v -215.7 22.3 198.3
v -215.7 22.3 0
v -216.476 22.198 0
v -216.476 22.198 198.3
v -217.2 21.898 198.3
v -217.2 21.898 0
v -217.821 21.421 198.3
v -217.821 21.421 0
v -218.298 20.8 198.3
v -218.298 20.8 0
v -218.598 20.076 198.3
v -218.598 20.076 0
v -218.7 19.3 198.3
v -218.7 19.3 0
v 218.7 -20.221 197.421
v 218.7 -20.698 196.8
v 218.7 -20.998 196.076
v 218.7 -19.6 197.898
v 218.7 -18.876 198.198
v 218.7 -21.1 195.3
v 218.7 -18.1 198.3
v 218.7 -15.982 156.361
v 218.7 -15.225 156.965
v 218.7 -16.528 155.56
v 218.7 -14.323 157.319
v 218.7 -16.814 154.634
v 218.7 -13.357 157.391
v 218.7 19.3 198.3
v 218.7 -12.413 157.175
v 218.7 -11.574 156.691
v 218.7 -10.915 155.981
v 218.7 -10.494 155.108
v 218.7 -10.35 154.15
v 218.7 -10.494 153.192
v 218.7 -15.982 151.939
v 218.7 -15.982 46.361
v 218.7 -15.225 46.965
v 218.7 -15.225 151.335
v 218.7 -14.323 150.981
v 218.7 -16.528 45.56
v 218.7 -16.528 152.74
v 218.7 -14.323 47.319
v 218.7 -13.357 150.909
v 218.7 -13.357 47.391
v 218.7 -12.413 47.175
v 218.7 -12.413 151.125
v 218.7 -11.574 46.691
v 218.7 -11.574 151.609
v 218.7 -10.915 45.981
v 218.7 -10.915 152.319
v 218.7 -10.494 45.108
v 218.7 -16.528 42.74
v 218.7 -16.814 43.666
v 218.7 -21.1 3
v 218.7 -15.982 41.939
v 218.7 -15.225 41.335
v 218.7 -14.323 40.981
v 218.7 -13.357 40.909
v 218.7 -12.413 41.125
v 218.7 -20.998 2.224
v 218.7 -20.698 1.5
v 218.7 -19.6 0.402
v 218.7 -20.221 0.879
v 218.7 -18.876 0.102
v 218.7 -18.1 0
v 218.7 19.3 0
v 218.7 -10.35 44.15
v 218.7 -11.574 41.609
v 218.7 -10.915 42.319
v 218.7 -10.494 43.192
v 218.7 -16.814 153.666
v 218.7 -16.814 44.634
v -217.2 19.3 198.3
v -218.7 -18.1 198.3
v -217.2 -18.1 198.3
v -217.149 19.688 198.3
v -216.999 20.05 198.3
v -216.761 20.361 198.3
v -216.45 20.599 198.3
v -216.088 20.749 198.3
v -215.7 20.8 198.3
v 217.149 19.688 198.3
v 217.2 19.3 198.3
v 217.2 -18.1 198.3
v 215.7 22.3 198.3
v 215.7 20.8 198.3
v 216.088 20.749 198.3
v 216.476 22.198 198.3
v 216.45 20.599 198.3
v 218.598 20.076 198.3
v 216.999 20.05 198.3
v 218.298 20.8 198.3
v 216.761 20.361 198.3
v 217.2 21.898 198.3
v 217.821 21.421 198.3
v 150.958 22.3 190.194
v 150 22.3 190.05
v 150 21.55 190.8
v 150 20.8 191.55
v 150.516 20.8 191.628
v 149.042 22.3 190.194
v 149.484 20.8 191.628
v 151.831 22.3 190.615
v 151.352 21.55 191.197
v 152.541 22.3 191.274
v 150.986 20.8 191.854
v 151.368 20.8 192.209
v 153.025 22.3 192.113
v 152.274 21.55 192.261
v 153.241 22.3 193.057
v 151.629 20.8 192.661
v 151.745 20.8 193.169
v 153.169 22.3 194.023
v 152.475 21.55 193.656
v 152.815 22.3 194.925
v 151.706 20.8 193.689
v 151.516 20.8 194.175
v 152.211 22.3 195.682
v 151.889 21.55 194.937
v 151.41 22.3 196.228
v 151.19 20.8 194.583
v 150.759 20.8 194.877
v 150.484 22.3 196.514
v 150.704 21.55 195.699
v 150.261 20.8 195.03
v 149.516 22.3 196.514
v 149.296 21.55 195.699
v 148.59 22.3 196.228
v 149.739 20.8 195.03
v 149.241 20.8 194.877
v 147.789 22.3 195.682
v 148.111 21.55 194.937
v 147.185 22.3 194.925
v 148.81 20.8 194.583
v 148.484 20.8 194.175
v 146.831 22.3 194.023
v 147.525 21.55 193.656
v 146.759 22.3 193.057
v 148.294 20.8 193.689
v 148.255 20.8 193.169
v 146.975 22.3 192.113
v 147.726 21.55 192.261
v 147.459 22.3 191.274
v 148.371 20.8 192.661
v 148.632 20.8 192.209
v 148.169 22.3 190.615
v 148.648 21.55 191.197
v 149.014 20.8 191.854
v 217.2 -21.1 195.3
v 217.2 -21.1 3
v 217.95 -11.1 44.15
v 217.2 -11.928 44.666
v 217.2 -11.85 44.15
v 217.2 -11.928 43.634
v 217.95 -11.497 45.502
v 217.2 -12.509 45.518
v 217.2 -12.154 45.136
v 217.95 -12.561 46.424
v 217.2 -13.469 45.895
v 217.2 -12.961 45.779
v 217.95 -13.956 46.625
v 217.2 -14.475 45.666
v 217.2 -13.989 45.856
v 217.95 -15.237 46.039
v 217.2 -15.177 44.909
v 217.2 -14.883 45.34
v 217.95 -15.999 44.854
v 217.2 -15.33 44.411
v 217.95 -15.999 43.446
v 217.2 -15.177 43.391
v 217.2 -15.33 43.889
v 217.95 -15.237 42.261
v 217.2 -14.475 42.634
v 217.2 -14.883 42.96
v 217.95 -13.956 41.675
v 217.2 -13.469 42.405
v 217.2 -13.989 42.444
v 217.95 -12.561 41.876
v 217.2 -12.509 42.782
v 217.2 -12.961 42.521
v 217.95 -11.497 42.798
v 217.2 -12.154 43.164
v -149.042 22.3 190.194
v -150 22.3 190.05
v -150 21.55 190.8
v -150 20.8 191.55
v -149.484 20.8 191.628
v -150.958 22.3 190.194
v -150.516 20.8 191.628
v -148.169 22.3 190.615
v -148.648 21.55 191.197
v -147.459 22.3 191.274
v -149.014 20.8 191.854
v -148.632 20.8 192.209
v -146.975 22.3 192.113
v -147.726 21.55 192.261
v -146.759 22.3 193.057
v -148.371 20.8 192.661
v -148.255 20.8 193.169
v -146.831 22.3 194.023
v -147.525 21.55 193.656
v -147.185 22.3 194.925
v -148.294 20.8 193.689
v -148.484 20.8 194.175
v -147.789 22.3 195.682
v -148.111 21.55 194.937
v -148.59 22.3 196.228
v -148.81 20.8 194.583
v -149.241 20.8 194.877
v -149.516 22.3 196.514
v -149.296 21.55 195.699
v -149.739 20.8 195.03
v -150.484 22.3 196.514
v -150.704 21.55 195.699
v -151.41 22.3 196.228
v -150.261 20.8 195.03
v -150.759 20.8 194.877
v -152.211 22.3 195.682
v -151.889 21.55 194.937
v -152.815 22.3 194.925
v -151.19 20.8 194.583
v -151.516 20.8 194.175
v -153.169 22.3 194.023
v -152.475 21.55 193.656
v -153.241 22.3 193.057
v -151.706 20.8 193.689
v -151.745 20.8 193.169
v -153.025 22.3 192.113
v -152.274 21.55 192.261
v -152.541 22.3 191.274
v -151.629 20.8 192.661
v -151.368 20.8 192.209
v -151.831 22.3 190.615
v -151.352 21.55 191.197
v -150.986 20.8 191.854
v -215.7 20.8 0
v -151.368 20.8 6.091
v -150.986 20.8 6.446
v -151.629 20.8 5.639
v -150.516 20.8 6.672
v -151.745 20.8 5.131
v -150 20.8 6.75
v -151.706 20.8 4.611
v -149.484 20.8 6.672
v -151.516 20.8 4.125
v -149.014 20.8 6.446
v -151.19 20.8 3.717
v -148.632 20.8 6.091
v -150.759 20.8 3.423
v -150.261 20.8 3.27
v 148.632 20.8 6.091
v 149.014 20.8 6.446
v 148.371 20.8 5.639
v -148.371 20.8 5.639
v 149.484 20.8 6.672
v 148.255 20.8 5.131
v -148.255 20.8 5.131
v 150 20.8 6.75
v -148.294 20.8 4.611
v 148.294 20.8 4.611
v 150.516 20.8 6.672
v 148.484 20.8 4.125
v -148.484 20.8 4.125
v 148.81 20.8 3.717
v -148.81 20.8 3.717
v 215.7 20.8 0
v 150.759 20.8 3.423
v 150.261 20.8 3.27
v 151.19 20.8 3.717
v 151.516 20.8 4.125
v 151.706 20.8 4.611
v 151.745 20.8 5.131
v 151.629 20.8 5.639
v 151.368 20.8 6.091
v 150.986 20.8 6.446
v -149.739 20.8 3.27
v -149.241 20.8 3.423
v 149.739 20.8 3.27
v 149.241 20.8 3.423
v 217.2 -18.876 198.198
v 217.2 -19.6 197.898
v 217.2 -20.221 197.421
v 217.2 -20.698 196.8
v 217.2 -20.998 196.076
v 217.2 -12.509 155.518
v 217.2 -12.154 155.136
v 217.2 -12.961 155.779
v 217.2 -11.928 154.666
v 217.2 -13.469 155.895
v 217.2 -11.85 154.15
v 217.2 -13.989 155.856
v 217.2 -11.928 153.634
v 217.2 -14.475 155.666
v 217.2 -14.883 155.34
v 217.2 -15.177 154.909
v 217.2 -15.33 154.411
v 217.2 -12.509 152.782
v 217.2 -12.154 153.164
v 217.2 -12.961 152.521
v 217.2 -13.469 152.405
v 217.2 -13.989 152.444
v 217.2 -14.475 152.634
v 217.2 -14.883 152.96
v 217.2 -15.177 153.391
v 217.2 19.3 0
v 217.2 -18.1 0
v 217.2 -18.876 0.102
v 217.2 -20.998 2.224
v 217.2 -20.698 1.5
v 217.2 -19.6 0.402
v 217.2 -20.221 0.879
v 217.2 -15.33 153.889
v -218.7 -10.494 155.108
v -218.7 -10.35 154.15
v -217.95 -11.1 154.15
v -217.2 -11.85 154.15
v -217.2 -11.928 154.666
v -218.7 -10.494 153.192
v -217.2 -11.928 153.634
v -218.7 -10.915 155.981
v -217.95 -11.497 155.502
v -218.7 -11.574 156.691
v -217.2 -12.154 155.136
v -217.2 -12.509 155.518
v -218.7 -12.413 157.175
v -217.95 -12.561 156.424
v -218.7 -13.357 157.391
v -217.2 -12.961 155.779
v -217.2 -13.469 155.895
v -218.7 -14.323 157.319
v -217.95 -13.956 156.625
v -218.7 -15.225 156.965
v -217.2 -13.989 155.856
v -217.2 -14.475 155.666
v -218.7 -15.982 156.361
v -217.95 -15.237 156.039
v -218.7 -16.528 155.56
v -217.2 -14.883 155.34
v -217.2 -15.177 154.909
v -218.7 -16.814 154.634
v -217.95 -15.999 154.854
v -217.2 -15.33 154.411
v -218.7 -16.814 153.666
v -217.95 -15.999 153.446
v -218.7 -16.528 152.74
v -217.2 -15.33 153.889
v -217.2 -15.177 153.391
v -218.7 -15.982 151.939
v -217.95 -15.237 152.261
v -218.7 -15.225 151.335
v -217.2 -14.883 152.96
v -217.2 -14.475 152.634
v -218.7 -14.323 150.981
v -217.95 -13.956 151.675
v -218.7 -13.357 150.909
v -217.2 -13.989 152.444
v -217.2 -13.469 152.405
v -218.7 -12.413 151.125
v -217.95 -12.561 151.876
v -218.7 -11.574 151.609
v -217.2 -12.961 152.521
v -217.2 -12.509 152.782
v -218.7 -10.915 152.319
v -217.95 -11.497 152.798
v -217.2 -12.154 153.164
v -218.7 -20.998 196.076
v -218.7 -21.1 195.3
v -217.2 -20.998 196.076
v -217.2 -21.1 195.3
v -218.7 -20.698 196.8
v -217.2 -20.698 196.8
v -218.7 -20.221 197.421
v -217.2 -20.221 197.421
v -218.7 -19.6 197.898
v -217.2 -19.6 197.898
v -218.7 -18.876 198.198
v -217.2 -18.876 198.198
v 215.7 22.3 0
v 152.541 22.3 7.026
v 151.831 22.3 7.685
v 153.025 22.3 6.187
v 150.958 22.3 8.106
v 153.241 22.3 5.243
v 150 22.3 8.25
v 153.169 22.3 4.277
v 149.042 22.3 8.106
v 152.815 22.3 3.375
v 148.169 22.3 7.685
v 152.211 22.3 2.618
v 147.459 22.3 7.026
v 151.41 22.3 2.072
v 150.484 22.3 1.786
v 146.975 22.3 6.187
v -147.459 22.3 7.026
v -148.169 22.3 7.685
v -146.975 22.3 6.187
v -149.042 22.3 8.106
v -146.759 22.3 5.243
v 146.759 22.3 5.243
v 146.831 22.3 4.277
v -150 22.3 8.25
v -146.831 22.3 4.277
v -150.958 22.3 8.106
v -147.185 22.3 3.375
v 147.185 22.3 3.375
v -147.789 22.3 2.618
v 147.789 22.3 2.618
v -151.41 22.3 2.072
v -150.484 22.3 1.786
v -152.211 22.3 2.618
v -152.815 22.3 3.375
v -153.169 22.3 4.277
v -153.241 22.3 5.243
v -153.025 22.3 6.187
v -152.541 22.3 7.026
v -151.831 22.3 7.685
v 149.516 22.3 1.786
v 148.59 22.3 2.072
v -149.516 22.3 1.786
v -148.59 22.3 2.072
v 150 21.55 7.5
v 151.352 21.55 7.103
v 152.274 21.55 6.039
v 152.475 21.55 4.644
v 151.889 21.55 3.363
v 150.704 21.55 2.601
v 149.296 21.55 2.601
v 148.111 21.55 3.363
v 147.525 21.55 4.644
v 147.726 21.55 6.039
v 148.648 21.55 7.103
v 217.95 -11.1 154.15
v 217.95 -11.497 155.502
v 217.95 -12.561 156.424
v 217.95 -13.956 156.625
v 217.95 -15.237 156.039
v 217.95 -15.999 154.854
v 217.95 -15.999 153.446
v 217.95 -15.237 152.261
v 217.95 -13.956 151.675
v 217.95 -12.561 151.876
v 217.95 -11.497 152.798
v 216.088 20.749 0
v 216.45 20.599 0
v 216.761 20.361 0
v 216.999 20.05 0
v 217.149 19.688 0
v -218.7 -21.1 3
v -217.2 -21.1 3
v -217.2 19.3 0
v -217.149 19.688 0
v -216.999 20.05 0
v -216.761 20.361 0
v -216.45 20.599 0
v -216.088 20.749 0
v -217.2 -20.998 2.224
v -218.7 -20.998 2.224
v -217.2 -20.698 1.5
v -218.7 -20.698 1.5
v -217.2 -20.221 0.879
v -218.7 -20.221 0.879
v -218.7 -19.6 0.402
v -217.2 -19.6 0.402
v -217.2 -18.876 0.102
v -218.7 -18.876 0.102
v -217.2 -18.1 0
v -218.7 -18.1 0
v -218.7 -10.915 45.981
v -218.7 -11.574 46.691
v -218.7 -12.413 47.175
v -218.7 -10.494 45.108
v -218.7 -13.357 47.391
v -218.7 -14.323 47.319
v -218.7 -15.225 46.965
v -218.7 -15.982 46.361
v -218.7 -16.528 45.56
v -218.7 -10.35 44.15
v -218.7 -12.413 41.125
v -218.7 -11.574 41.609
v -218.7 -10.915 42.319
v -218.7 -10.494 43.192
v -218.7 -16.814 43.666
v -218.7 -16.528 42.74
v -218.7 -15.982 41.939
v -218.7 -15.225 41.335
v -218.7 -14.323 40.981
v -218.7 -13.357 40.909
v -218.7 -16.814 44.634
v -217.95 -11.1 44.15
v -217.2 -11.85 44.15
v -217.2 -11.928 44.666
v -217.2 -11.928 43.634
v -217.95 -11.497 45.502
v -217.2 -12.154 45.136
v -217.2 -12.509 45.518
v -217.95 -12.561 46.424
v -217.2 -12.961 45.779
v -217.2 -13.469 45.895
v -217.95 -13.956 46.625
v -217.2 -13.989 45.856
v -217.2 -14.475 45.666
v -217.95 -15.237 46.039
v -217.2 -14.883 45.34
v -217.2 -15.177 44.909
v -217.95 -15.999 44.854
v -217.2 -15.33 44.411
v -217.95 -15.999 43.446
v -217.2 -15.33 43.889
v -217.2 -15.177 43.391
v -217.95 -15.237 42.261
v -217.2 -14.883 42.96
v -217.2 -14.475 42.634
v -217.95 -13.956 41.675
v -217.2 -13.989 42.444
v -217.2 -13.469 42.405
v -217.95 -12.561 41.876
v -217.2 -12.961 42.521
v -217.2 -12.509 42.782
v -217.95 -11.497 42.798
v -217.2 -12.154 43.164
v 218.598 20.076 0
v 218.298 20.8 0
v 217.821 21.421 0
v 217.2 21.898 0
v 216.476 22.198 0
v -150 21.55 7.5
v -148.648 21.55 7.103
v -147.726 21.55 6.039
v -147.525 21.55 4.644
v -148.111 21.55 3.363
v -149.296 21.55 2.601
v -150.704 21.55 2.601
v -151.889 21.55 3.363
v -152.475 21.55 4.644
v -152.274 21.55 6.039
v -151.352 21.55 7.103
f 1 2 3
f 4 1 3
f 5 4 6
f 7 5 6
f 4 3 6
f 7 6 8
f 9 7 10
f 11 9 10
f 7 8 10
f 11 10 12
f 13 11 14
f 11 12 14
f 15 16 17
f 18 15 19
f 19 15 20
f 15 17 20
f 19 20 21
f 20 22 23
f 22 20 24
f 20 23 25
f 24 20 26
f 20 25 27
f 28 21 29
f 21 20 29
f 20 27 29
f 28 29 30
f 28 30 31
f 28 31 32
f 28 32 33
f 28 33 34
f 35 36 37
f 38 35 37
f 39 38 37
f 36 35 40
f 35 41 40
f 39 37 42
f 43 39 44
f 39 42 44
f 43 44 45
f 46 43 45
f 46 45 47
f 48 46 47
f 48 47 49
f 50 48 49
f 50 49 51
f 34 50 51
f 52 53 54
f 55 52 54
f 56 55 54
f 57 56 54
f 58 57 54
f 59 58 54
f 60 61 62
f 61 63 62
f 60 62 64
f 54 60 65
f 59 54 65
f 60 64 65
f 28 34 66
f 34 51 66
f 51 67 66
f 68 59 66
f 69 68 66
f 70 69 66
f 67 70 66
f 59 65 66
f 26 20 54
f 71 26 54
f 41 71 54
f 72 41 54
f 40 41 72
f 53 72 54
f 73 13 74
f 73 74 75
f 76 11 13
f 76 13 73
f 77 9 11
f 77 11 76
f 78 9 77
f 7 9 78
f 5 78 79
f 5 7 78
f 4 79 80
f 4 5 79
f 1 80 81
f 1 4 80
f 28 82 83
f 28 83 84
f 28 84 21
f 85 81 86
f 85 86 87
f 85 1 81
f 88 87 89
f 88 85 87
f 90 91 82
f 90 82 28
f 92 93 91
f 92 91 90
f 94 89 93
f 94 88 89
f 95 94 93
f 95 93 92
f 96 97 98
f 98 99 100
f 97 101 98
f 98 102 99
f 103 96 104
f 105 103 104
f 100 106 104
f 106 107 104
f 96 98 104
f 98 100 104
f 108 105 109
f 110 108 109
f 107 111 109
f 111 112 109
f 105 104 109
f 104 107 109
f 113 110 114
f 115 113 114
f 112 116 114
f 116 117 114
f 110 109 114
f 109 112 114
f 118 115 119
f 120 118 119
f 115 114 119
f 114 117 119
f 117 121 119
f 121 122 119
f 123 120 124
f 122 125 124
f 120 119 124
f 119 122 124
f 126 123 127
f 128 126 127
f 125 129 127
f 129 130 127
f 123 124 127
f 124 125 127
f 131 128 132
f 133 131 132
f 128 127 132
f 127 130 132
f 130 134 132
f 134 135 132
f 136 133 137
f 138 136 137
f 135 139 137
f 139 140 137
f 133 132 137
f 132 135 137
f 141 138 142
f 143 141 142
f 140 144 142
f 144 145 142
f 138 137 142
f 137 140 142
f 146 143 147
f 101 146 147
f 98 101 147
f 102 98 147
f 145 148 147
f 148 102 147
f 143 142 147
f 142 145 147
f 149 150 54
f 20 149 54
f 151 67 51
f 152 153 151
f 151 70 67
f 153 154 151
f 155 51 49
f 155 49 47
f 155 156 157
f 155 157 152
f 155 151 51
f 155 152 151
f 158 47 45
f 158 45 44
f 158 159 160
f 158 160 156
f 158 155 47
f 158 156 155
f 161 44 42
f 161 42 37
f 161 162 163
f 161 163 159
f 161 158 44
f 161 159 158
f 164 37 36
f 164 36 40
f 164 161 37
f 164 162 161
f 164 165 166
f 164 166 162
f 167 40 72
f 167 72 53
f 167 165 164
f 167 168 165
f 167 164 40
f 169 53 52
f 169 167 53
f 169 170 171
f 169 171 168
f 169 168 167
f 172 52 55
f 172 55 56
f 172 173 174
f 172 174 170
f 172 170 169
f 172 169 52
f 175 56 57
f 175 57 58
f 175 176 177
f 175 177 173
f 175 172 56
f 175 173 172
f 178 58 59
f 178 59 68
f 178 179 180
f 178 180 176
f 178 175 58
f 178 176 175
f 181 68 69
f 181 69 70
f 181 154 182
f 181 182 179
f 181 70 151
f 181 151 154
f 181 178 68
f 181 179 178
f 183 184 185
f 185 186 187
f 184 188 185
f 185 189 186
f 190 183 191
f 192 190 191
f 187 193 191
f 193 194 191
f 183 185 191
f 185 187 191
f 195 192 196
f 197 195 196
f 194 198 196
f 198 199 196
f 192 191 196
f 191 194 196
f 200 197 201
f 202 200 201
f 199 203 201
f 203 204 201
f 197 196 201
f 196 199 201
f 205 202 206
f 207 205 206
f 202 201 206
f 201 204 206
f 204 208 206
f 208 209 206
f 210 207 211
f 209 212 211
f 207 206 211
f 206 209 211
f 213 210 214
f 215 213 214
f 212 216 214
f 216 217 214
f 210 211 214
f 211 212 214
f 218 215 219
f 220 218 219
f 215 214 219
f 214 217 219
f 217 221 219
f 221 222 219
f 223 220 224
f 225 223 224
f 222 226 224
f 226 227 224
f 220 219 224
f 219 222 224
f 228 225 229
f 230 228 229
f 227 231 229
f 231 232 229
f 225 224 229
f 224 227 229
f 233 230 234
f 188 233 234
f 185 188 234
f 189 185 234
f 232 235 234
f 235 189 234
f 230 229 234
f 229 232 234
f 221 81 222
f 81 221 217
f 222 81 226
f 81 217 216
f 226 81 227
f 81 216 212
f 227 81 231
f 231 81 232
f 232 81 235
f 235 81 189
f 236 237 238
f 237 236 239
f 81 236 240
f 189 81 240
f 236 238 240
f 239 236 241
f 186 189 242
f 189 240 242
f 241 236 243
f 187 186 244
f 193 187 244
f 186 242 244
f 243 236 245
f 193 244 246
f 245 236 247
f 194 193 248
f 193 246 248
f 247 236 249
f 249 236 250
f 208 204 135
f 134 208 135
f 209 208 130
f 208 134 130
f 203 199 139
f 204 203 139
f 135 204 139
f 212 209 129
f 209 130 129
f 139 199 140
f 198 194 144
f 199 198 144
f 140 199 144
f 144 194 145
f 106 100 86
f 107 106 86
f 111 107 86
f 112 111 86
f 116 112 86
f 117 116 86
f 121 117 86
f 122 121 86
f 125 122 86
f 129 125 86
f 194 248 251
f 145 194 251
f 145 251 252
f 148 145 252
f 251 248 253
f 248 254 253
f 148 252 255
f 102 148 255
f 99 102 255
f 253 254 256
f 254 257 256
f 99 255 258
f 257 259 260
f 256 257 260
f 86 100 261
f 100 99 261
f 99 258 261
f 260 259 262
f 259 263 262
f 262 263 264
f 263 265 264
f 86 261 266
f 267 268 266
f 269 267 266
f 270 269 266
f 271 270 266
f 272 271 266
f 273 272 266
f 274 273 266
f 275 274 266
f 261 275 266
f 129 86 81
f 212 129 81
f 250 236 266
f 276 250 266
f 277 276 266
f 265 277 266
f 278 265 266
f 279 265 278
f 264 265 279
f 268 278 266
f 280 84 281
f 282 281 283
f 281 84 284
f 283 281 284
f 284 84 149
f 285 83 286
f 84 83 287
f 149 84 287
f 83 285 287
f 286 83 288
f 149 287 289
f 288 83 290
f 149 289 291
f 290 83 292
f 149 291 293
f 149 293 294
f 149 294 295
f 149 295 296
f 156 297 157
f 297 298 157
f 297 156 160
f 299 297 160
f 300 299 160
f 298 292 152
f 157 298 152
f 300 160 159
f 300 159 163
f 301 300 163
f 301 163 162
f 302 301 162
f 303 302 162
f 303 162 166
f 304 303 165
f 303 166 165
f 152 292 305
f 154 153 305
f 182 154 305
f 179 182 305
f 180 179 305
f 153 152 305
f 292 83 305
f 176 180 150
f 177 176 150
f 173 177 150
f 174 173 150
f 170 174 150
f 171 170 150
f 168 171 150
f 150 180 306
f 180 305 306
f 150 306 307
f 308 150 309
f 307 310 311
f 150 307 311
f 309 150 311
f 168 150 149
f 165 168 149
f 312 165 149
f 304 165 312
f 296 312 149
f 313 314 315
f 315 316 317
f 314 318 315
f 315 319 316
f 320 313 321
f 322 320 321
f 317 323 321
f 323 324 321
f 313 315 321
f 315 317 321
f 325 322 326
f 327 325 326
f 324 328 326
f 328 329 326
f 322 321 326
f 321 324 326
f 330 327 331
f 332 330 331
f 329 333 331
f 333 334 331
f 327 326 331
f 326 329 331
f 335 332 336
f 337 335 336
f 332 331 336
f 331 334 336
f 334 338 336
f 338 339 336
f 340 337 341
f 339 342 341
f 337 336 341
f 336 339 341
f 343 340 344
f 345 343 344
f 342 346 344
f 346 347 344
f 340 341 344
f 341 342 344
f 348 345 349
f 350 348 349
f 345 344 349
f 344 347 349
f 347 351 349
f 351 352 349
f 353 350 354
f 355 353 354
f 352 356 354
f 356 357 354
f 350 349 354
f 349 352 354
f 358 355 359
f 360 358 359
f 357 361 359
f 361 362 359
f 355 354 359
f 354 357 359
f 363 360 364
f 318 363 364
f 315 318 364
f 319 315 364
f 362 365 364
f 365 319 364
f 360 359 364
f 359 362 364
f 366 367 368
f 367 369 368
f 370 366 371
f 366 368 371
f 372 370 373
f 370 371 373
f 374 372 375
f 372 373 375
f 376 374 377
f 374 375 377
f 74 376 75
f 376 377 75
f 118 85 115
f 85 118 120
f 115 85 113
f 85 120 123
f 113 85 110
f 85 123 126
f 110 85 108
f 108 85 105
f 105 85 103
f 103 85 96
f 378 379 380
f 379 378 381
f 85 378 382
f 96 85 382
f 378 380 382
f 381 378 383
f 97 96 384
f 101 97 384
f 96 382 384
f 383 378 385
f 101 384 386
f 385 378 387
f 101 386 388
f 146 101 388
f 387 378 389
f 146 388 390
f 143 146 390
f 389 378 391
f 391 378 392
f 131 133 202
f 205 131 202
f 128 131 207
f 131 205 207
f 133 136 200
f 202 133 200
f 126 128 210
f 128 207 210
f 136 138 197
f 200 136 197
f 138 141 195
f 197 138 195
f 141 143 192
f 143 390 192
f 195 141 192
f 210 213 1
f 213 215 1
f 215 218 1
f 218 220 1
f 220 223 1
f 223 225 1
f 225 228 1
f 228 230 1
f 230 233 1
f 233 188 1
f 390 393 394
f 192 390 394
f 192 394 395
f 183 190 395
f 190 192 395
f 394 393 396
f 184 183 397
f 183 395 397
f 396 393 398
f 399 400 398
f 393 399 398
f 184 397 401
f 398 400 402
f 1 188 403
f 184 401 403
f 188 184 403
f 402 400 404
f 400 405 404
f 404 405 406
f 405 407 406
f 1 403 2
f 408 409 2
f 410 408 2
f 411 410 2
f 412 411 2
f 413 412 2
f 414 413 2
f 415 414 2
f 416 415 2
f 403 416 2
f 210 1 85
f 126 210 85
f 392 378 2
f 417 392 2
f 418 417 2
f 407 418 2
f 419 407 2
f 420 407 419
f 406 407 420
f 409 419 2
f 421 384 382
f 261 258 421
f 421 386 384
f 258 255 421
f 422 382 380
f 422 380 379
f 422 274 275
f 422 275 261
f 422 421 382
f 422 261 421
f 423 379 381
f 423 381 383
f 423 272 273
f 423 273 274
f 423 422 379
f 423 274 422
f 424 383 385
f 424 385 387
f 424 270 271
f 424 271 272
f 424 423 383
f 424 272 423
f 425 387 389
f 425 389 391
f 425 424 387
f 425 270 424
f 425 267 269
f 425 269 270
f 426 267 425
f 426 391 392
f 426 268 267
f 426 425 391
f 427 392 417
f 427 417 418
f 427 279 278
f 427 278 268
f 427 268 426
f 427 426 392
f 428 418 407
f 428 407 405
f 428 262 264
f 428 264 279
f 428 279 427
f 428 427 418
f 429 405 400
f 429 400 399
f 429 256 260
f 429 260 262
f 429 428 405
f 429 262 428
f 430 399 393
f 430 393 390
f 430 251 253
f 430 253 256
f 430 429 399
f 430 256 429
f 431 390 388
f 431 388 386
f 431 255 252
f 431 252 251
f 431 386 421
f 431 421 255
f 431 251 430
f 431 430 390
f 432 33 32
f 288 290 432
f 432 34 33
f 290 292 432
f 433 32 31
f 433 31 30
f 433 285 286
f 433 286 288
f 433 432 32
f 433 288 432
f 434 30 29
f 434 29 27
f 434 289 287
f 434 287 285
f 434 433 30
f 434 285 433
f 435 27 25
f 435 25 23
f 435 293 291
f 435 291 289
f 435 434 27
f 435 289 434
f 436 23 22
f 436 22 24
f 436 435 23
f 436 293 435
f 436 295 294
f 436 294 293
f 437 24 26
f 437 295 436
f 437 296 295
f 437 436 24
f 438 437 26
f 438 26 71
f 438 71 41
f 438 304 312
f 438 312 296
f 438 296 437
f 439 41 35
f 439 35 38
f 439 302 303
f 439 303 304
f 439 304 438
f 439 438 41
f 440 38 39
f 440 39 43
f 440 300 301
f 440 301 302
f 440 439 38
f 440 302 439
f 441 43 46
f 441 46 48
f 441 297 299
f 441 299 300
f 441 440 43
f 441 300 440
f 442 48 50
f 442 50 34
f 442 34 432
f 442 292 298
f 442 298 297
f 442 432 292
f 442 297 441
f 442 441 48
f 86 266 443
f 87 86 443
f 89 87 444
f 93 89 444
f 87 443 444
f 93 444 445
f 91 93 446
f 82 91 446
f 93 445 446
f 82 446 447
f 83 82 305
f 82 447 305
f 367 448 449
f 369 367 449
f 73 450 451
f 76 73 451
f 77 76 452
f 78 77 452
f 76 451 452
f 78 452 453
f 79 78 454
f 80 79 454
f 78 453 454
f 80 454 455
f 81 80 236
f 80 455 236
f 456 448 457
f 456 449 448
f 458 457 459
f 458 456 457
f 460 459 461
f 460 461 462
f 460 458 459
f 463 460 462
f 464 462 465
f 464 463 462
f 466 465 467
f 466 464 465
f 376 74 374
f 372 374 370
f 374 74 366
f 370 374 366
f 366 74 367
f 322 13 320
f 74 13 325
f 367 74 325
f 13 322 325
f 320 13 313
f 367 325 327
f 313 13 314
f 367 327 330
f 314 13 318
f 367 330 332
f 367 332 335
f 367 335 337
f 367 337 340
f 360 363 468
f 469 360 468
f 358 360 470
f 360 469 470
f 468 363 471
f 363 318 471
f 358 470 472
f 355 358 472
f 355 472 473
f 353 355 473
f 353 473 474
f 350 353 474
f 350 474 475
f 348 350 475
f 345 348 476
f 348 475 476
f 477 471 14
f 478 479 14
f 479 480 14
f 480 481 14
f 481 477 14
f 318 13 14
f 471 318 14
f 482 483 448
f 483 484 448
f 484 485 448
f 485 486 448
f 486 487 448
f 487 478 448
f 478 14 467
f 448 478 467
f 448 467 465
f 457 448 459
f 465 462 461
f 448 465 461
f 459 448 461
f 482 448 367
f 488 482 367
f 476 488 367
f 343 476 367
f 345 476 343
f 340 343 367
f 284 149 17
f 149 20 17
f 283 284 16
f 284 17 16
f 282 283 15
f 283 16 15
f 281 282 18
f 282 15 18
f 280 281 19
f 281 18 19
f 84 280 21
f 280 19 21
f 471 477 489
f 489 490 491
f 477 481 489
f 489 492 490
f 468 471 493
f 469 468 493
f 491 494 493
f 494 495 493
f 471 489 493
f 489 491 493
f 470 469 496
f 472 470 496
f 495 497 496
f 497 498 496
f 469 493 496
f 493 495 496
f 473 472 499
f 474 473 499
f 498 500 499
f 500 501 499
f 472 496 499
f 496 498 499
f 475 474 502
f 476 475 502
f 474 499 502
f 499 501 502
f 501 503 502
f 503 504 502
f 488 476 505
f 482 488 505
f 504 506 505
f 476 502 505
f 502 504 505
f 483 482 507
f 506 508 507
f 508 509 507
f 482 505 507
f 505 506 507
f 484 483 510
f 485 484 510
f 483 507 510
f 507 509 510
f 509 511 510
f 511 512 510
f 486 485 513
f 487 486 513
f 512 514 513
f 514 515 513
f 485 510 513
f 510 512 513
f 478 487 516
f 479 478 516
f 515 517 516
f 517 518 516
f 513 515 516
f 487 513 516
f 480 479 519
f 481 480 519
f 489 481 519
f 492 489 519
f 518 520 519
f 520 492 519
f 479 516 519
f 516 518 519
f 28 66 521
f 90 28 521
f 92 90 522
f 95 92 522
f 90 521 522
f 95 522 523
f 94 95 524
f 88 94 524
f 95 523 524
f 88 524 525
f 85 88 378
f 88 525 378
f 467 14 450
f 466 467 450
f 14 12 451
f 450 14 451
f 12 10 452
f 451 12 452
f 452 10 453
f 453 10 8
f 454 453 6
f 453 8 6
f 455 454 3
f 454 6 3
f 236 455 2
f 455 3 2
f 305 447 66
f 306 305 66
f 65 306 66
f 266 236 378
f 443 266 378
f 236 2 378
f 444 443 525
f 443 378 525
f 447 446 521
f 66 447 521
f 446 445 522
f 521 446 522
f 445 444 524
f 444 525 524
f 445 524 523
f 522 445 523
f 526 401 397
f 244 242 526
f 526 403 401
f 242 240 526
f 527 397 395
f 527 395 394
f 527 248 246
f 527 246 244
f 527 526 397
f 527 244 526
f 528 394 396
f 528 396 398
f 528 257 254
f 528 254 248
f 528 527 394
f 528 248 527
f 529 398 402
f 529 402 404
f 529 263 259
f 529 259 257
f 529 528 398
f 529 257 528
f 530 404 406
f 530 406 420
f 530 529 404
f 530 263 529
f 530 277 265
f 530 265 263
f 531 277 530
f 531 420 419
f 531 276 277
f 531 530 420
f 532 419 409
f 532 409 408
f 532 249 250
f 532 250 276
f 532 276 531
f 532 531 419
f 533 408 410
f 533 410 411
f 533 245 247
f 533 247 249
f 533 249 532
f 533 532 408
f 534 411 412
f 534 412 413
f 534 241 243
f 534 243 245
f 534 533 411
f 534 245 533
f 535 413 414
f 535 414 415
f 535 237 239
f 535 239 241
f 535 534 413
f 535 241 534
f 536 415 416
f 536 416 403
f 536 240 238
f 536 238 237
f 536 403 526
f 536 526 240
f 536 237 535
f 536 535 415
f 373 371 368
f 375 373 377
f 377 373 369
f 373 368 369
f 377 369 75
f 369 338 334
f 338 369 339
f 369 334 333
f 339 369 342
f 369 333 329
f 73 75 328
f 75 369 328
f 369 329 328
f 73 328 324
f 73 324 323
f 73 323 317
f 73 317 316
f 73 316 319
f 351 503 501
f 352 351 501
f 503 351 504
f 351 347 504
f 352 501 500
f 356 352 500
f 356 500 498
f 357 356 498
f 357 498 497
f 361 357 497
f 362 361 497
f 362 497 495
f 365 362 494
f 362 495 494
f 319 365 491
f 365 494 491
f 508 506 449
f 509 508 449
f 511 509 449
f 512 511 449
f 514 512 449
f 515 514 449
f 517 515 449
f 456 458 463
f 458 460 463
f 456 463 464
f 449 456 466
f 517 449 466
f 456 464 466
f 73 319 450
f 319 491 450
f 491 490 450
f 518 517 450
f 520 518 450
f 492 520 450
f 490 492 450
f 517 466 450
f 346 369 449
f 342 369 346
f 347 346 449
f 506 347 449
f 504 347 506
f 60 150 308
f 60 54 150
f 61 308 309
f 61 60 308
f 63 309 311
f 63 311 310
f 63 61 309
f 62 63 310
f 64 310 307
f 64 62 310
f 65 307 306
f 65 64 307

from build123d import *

# Parameters (mm, degrees)
SM_BASE_FLANGE_1_DEPTH = 198.3
FILLET_1_R             = 3
SKETCH_6_R             = 1.65
CUT_EXTRUDE_1_DEPTH    = 299.389242433
CUT_EXTRUDE_2_REACH    = 482.769
SKETCH_7_R             = 1.65
CHAMFER_2_SIZE         = 1.6


# Sheet-metal steps are written as plain solids
with BuildPart() as part:
    # Sketch 1 → Базовая кромка1 (new body)
    with BuildSketch(Plane.XY):
        with BuildLine():
            Line((-217.2, -21.1), (-217.2, 19.3))
            ThreePointArc((-217.2, 19.3), (-216.760660172, 20.360660172), (-215.7, 20.8))
            Line((-215.7, 20.8), (215.7, 20.8))
            ThreePointArc((215.7, 20.8), (216.760660172, 20.360660172), (217.2, 19.3))
            Line((217.2, 19.3), (217.2, -21.1))
            Line((217.2, -21.1), (218.7, -21.1))
            Line((218.7, -21.1), (218.7, 19.3))
            ThreePointArc((218.7, 19.3), (217.821320344, 21.421320344), (215.7, 22.3))
            Line((215.7, 22.3), (-215.7, 22.3))
            ThreePointArc((-215.7, 22.3), (-217.821320344, 21.421320344), (-218.7, 19.3))
            Line((-218.7, 19.3), (-218.7, -21.1))
            Line((-218.7, -21.1), (-217.2, -21.1))
        make_face()
    extrude(amount=SM_BASE_FLANGE_1_DEPTH)

    # Скругление1
    fillet_1_edges = [part.edges().sort_by_distance(p)[0] for p in [
        (-217.95, -21.1, 0),
        (217.95, -21.1, 0),
        (-217.95, -21.1, 198.3),
        (217.95, -21.1, 198.3),
    ]]
    fillet(fillet_1_edges, radius=FILLET_1_R)

    # Эскиз6 → Вырез-Вытянуть1 (cut, through all)
    with BuildSketch(Plane(origin=(0, 22.3, 0), x_dir=(1, 0, 0), z_dir=(0, 1, 0))):
        with Locations(Location((-150, -5, 0), (0, 0, 270))):
            Circle(SKETCH_6_R)
        with Locations(Location((150, -5, 0), (0, 0, 270))):
            Circle(SKETCH_6_R)
    cut_extrude_1 = extrude(amount=-CUT_EXTRUDE_1_DEPTH, mode=Mode.SUBTRACT)

    # Зеркальное отражение1: Вырез-Вытянуть1 across plane
    add(cut_extrude_1.mirror(Plane(origin=(0, 0, 99.15), x_dir=(1, 0, 0), z_dir=(0, 0, -1))), mode=Mode.SUBTRACT)

    # Вырез-Вытянуть2: up to this face of the body (flat: up to its plane)
    cut_extrude_2_end = Plane(part.part.faces().sort_by_distance((-218.7, -0.890578691, 99.15))[0])
    # Эскиз7 → Вырез-Вытянуть2 (cut, up to the picked face)
    with BuildSketch(Plane(origin=(218.7, 0, 0), x_dir=(0, 0, -1), z_dir=(1, 0, 0)), mode=Mode.PRIVATE) as cut_extrude_2_sk1:
        with Locations(Location((-154.15, -13.6, 0), (0, 0, 90))):
            Circle(SKETCH_7_R)
    cut_extrude_2_tool1 = split(extrude(cut_extrude_2_sk1.sketch, amount=-CUT_EXTRUDE_2_REACH, mode=Mode.PRIVATE), bisect_by=cut_extrude_2_end, keep=Keep.BOTH, mode=Mode.PRIVATE)
    # Эскиз7 → Вырез-Вытянуть2 (cut, up to the picked face)
    with BuildSketch(Plane(origin=(218.7, 0, 0), x_dir=(0, 0, -1), z_dir=(1, 0, 0)), mode=Mode.PRIVATE) as cut_extrude_2_sk2:
        with Locations(Location((-44.15, -13.6, 0), (0, 0, 90))):
            Circle(SKETCH_7_R)
    cut_extrude_2_tool2 = split(extrude(cut_extrude_2_sk2.sketch, amount=-CUT_EXTRUDE_2_REACH, mode=Mode.PRIVATE), bisect_by=cut_extrude_2_end, keep=Keep.BOTH, mode=Mode.PRIVATE)
    add(cut_extrude_2_tool1.solids().sort_by(Axis((218.7, -13.6, 154.15), (-1, 0, 0)))[0], mode=Mode.SUBTRACT)
    add(cut_extrude_2_tool2.solids().sort_by(Axis((218.7, -13.6, 44.15), (-1, 0, 0)))[0], mode=Mode.SUBTRACT)

    # Фаска2
    # the kernel refuses this chamfer: 1.6 mm, written as the material it takes off along each edge
    with BuildSketch(Plane(origin=(-218.7, -13.6, 44.15), x_dir=(0, 1, 0), z_dir=(0, 0, -1))) as chamfer_2_piece_1:
        Polygon((1.65 + CHAMFER_2_SIZE, 0), (1.65, CHAMFER_2_SIZE), (1.65, 0), align=None)
    revolve(axis=Axis((-218.7, -13.6, 44.15), (1, 0, 0)), mode=Mode.SUBTRACT)
    with BuildSketch(Plane(origin=(-218.7, -13.6, 154.15), x_dir=(0, 1, 0), z_dir=(0, 0, -1))) as chamfer_2_piece_2:
        Polygon((1.65 + CHAMFER_2_SIZE, 0), (1.65, CHAMFER_2_SIZE), (1.65, 0), align=None)
    revolve(axis=Axis((-218.7, -13.6, 154.15), (1, 0, 0)), mode=Mode.SUBTRACT)
    with BuildSketch(Plane(origin=(-150, 22.3, 193.3), x_dir=(0, 0, -1), z_dir=(-1, 0, 0))) as chamfer_2_piece_3:
        Polygon((1.65 + CHAMFER_2_SIZE, 0), (1.65, CHAMFER_2_SIZE), (1.65, 0), align=None)
    revolve(axis=Axis((-150, 22.3, 193.3), (0, -1, 0)), mode=Mode.SUBTRACT)
    with BuildSketch(Plane(origin=(-150, 22.3, 5), x_dir=(0, 0, 1), z_dir=(-1, 0, 0))) as chamfer_2_piece_4:
        Polygon((1.65 + CHAMFER_2_SIZE, 0), (1.65, -CHAMFER_2_SIZE), (1.65, 0), align=None)
    revolve(axis=Axis((-150, 22.3, 5), (0, 1, 0)), mode=Mode.SUBTRACT)
    with BuildSketch(Plane(origin=(150, 22.3, 5), x_dir=(0, 0, 1), z_dir=(-1, 0, 0))) as chamfer_2_piece_5:
        Polygon((1.65 + CHAMFER_2_SIZE, 0), (1.65, -CHAMFER_2_SIZE), (1.65, 0), align=None)
    revolve(axis=Axis((150, 22.3, 5), (0, 1, 0)), mode=Mode.SUBTRACT)
    with BuildSketch(Plane(origin=(218.7, -13.6, 44.15), x_dir=(0, 1, 0), z_dir=(0, 0, -1))) as chamfer_2_piece_6:
        Polygon((1.65 + CHAMFER_2_SIZE, 0), (1.65, -CHAMFER_2_SIZE), (1.65, 0), align=None)
    revolve(axis=Axis((218.7, -13.6, 44.15), (1, 0, 0)), mode=Mode.SUBTRACT)
    with BuildSketch(Plane(origin=(218.7, -13.6, 154.15), x_dir=(0, 1, 0), z_dir=(0, 0, -1))) as chamfer_2_piece_7:
        Polygon((1.65 + CHAMFER_2_SIZE, 0), (1.65, -CHAMFER_2_SIZE), (1.65, 0), align=None)
    revolve(axis=Axis((218.7, -13.6, 154.15), (1, 0, 0)), mode=Mode.SUBTRACT)
    with BuildSketch(Plane(origin=(150, 22.3, 193.3), x_dir=(0, 0, -1), z_dir=(-1, 0, 0))) as chamfer_2_piece_8:
        Polygon((1.65 + CHAMFER_2_SIZE, 0), (1.65, CHAMFER_2_SIZE), (1.65, 0), align=None)
    revolve(axis=Axis((150, 22.3, 193.3), (0, -1, 0)), mode=Mode.SUBTRACT)


solid = part.part
